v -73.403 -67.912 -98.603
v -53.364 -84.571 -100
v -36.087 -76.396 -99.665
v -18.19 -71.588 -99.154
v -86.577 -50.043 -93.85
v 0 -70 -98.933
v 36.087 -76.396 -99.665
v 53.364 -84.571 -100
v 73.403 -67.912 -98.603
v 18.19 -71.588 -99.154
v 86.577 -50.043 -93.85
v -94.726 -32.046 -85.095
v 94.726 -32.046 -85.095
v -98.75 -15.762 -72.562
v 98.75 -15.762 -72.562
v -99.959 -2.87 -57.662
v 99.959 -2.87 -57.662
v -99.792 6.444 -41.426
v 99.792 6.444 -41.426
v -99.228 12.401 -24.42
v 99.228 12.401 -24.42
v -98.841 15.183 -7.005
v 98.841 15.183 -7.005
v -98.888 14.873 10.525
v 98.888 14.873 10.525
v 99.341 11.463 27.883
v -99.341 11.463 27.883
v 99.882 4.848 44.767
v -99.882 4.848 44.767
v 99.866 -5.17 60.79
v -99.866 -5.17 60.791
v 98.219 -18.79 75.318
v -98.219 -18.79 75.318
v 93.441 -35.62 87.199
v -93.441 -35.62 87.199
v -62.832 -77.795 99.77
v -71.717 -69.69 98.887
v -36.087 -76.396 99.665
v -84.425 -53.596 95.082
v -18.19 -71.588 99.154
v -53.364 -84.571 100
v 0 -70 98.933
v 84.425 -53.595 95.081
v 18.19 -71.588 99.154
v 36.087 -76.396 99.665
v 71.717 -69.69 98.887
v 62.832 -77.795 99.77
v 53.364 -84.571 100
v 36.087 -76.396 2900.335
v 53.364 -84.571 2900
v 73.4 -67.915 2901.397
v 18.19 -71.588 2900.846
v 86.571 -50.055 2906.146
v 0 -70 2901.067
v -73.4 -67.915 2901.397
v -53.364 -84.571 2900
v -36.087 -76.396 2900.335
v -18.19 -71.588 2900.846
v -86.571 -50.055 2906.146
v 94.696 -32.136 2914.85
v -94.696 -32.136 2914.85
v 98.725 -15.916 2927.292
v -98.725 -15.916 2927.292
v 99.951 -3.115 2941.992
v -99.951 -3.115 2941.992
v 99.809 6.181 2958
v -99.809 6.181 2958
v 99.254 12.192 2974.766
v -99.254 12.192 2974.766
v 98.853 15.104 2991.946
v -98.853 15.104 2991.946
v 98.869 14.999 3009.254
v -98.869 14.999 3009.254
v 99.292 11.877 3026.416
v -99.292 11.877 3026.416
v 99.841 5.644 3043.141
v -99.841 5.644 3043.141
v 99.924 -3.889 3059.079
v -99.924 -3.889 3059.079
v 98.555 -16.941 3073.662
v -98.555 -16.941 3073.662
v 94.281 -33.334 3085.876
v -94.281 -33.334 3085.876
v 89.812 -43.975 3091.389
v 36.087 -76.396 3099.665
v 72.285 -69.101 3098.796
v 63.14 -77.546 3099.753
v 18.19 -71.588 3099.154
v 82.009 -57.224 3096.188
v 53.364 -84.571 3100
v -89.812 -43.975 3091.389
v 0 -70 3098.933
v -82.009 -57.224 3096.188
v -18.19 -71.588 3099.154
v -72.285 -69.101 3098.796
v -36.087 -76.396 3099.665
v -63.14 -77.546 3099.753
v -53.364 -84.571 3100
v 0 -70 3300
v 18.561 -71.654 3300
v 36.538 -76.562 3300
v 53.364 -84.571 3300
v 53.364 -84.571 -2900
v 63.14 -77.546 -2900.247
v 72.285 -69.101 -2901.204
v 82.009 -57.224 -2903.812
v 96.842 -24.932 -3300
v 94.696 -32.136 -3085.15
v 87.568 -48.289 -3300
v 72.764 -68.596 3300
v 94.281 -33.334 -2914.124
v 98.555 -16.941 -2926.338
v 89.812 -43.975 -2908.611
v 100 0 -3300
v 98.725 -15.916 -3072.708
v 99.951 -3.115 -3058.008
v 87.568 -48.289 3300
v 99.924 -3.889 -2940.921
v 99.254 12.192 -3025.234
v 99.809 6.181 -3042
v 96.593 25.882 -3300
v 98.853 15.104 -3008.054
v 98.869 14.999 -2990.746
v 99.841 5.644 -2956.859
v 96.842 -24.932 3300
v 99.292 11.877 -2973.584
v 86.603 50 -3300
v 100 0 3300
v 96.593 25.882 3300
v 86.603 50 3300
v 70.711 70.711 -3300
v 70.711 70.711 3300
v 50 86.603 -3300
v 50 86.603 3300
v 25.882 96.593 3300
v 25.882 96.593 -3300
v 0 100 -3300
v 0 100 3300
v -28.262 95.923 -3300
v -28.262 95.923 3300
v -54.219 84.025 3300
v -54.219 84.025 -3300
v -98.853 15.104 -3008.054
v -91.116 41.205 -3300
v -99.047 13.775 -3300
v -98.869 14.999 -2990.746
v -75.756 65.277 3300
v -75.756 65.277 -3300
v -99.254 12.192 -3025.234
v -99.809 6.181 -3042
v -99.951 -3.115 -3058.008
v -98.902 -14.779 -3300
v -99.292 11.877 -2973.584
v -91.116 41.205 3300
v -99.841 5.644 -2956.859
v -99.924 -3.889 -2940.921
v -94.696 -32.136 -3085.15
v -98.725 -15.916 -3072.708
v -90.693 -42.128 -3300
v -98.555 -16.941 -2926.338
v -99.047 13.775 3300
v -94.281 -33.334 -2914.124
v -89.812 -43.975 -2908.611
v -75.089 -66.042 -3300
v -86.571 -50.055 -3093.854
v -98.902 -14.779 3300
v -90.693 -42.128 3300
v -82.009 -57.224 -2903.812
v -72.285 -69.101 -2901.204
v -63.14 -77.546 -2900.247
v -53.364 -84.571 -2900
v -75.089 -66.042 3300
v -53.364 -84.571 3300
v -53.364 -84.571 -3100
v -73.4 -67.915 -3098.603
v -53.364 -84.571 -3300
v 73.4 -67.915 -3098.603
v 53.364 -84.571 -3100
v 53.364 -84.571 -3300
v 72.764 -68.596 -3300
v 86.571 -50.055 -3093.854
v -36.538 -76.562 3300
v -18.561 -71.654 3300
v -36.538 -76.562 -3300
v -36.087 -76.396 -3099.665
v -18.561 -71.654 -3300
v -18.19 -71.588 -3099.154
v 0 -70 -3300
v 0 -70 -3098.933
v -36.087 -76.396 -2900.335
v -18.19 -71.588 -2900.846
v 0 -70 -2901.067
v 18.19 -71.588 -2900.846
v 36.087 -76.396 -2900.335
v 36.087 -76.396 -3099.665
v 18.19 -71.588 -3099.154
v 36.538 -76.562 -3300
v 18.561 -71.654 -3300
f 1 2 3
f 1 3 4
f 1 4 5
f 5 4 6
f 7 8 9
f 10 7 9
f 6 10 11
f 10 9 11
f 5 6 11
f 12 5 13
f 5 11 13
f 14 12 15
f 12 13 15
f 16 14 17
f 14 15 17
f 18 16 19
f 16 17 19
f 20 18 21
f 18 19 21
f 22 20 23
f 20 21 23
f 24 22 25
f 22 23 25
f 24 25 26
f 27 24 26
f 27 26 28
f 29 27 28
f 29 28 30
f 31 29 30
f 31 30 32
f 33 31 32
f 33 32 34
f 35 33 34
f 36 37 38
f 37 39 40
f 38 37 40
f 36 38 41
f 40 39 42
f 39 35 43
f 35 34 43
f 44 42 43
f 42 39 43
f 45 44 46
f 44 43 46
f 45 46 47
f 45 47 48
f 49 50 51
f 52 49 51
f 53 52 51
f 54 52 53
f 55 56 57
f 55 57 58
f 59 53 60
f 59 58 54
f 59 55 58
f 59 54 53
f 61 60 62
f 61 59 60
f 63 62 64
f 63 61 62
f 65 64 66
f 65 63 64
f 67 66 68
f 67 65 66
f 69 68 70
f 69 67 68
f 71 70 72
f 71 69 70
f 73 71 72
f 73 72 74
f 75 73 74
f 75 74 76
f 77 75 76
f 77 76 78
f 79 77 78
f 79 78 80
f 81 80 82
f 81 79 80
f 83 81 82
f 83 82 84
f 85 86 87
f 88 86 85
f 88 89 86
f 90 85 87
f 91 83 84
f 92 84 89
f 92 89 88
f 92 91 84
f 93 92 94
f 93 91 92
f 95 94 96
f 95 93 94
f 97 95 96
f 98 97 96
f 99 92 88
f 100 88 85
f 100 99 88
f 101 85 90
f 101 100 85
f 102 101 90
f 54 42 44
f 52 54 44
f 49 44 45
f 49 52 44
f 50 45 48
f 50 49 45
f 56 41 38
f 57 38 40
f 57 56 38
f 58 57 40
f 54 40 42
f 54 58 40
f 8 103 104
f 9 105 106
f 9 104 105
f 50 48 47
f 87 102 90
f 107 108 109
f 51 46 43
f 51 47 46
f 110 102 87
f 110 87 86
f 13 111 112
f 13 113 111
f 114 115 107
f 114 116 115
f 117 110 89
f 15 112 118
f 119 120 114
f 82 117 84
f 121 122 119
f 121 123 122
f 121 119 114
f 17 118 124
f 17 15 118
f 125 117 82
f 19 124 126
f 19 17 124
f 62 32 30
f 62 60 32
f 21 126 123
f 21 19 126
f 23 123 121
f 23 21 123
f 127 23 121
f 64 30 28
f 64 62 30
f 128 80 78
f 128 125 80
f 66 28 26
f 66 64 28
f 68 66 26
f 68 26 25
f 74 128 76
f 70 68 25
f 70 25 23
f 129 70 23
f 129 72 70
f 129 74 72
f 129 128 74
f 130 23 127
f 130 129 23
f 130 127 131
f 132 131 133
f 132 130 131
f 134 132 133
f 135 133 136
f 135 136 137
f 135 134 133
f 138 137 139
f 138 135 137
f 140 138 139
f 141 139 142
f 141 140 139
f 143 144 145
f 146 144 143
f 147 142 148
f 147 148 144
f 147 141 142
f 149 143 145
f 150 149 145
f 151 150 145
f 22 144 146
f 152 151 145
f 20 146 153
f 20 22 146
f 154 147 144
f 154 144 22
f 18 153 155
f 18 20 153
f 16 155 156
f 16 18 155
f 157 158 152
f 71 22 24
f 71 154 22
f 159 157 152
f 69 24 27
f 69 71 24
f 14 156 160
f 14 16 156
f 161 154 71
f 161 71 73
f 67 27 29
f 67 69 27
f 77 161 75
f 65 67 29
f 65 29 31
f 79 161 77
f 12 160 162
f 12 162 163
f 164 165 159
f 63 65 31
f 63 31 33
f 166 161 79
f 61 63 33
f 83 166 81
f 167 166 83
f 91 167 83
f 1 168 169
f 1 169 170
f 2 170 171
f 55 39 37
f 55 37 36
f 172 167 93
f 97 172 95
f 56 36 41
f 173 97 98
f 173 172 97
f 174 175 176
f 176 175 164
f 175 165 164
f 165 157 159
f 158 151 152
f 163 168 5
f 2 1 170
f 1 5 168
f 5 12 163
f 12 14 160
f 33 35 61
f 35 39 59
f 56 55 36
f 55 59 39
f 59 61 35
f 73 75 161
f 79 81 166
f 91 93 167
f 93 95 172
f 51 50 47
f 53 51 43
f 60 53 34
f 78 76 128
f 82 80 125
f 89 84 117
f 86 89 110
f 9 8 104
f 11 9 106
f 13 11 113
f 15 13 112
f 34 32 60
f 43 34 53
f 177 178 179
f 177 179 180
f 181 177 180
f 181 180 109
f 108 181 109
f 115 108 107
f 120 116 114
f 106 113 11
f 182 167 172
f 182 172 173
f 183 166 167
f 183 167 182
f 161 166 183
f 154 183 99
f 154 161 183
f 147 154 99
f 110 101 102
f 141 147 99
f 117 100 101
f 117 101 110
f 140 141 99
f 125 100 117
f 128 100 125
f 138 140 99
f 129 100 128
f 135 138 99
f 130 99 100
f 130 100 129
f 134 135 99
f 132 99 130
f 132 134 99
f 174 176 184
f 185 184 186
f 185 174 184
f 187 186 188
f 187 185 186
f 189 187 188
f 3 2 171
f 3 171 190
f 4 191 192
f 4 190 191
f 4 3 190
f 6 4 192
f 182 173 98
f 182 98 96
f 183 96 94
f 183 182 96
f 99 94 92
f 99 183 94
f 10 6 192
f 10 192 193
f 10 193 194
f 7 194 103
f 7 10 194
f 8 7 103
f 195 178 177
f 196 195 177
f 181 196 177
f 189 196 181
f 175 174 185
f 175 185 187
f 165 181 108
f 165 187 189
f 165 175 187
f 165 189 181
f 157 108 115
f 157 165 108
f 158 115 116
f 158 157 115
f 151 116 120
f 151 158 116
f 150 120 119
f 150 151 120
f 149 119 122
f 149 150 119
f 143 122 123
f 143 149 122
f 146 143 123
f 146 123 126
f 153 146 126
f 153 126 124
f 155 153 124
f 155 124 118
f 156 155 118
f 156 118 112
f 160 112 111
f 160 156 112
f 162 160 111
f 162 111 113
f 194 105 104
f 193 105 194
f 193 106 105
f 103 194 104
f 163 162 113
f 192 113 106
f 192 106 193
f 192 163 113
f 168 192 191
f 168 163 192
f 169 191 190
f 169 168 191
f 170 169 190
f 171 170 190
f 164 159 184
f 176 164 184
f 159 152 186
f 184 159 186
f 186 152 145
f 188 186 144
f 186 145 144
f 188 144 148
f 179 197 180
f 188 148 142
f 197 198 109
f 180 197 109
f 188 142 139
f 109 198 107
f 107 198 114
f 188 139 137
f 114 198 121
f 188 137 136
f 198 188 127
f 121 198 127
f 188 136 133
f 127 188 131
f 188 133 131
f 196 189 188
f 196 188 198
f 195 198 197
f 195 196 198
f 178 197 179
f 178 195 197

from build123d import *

# Parameters (mm, degrees)
EXTRUDE_1_DEPTH     = 3300
SKETCH_2_R          = 100
CUT_EXTRUDE_1_DEPTH = 3000


with BuildPart() as part:
    # Эскиз1 → Бобышка-Вытянуть1 (new, symmetric)
    with BuildSketch(Plane.XY):
        with BuildLine():
            ThreePointArc((100, 0), (70.710678119, 70.710678119), (0, 100))
            Line((0, 100), (0, -70))
            ThreePointArc((0, -70), (27.658633372, -73.708341903), (53.363596856, -84.571428571))
            ThreePointArc((53.363596856, -84.571428571), (87.568143995, -48.288923753), (100, 0))
        make_face()
        with BuildLine():
            Line((0, -70), (0, 100))
            ThreePointArc((0, 100), (-96.065453877, 27.774602993), (-53.363596856, -84.571428571))
            ThreePointArc((-53.363596856, -84.571428571), (-27.658633372, -73.708341903), (0, -70))
        make_face()
        with BuildLine():
            ThreePointArc((100, 0), (70.710678119, 70.710678119), (0, 100))
            Line((0, 100), (0, -70))
            ThreePointArc((0, -70), (27.658633372, -73.708341903), (53.363596856, -84.571428571))
            ThreePointArc((53.363596856, -84.571428571), (87.568143995, -48.288923753), (100, 0))
        make_face()
        with BuildLine():
            Line((0, -70), (0, 100))
            ThreePointArc((0, 100), (-96.065453877, 27.774602993), (-53.363596856, -84.571428571))
            ThreePointArc((-53.363596856, -84.571428571), (-27.658633372, -73.708341903), (0, -70))
        make_face()
    extrude(amount=EXTRUDE_1_DEPTH, both=True)

    # Эскиз2 → Вырез-Вытянуть1 (cut, symmetric)
    with BuildSketch(Plane(origin=(0, 0, 0), x_dir=(0, 0, -1), z_dir=(1, 0, 0))):
        with Locations((-3000, -84.571428571)):
            Circle(SKETCH_2_R)
        with Locations((3000, -84.571428571)):
            Circle(SKETCH_2_R)
        with Locations((0, -84.571428571)):
            Circle(SKETCH_2_R)
    extrude(amount=CUT_EXTRUDE_1_DEPTH, both=True, mode=Mode.SUBTRACT)


solid = part.part
